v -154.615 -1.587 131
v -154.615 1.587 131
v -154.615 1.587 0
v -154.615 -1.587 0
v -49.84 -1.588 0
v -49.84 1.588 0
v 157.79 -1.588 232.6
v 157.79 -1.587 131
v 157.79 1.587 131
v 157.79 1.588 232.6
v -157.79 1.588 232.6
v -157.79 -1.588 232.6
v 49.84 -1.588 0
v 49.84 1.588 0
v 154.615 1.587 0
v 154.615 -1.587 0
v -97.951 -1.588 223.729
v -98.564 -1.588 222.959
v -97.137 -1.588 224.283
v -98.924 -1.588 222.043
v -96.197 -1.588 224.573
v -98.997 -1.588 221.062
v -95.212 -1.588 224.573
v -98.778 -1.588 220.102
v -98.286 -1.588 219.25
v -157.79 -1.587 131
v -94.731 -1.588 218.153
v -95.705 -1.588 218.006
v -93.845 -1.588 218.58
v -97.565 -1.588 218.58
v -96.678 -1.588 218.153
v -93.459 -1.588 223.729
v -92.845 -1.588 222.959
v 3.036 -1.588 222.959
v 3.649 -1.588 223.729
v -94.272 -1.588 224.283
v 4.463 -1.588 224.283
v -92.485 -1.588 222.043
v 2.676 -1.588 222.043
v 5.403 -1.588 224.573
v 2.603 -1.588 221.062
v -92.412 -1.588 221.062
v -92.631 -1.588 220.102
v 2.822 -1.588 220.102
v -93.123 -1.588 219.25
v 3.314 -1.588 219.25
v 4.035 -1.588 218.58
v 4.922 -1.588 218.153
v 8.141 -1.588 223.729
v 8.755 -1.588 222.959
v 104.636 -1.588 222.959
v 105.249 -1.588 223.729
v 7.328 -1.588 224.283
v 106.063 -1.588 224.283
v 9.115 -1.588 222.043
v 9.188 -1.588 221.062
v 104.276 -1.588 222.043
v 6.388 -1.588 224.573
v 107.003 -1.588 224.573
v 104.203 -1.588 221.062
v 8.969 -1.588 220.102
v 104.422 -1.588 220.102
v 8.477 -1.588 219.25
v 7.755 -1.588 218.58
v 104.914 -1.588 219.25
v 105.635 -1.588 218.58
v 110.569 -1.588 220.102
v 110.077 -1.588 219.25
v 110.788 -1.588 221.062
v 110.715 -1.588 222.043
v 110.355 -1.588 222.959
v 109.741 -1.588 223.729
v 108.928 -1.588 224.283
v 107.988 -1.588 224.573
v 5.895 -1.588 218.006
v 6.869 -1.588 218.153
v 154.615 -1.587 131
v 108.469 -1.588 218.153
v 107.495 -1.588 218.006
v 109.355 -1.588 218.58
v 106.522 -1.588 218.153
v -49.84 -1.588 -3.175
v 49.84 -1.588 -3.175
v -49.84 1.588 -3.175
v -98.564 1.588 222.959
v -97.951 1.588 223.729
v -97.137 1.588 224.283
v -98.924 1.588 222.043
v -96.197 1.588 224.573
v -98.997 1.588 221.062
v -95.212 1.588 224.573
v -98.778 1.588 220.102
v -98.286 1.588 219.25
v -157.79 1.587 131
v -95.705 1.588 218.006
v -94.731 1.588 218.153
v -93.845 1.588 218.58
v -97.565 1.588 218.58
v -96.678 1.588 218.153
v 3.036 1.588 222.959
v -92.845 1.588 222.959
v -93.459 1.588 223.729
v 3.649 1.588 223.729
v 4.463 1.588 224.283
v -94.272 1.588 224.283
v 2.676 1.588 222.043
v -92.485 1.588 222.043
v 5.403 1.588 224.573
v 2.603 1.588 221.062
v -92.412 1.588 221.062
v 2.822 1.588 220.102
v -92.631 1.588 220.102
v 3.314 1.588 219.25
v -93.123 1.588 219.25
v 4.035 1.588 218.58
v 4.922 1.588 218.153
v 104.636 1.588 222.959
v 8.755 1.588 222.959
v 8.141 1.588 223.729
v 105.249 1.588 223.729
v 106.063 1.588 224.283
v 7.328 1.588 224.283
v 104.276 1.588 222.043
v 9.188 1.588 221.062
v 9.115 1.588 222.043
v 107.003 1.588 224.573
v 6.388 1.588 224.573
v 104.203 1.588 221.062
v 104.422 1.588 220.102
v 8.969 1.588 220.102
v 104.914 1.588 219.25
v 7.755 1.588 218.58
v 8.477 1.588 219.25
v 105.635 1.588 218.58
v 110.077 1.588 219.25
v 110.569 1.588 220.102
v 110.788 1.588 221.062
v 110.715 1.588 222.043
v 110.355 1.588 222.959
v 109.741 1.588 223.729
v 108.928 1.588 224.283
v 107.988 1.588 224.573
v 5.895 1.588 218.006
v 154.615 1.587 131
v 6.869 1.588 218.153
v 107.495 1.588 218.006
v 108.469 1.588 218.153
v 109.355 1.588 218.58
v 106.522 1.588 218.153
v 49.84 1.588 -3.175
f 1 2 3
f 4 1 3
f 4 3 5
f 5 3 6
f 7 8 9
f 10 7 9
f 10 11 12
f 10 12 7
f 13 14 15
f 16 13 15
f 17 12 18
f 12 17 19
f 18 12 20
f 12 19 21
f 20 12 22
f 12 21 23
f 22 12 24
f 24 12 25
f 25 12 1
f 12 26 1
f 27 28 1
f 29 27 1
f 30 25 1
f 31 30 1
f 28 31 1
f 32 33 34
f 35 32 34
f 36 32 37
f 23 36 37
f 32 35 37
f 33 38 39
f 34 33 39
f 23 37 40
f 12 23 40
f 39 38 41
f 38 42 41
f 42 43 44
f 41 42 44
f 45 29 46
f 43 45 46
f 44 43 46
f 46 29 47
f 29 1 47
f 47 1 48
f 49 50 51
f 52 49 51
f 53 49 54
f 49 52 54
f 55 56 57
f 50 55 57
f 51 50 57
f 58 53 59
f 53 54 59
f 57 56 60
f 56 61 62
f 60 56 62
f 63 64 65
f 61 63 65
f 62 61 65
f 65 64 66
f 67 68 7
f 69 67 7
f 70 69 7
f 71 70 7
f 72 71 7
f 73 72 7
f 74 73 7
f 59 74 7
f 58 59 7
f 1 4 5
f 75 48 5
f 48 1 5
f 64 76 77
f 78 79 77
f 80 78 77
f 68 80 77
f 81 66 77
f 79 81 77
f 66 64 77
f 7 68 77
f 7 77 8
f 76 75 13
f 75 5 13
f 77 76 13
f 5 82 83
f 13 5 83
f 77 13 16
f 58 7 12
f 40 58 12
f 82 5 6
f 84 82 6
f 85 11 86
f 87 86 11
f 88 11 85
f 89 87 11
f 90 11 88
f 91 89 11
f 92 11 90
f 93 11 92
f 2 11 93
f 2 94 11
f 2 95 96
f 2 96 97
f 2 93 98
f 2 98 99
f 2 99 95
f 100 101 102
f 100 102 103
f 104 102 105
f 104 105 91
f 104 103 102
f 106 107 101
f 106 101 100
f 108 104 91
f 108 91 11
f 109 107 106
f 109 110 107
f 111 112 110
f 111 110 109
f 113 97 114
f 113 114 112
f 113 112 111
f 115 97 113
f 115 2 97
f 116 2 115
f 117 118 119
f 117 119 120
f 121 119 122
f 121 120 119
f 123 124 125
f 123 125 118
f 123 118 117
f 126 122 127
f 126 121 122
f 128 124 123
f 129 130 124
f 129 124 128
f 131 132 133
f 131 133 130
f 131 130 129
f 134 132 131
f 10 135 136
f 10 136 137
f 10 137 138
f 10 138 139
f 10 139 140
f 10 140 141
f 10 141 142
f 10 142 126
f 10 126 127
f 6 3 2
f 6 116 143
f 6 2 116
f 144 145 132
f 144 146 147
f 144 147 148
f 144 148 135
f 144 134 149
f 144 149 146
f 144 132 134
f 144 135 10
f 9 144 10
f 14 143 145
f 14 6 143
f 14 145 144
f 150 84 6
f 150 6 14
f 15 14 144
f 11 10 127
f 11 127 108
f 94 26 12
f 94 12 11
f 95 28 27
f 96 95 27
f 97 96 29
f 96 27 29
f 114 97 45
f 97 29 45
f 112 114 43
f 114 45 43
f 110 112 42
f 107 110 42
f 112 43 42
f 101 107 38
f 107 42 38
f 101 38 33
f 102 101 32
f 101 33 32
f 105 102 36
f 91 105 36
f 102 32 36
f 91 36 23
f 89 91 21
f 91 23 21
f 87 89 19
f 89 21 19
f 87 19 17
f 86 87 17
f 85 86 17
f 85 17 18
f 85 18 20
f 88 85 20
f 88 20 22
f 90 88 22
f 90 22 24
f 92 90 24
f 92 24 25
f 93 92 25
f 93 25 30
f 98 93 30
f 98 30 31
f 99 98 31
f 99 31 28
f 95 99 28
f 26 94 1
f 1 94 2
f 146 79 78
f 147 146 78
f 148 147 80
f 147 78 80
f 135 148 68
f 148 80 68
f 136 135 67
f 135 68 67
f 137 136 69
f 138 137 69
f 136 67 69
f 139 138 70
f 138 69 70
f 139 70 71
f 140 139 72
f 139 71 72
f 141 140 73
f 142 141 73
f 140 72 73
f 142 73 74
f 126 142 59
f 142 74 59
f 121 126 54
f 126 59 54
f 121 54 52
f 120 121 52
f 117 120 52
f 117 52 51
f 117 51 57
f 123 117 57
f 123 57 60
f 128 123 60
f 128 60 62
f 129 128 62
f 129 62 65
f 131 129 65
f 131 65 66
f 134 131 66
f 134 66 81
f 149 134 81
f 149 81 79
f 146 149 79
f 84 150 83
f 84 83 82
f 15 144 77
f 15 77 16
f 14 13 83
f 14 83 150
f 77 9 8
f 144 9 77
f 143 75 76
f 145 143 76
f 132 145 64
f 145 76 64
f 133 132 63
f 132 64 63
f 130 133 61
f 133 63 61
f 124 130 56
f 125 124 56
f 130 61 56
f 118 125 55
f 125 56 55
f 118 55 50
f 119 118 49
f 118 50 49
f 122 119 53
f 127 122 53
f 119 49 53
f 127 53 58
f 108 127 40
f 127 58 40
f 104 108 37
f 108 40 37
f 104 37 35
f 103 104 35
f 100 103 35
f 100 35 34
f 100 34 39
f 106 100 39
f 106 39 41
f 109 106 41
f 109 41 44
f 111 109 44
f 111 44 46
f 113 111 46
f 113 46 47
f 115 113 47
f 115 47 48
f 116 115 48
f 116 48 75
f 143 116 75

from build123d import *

# Parameters (mm, degrees)
SKETCH1_W           = 315.58
SKETCH1_H           = 3.175
BOSS_EXTRUDE1_DEPTH = 232.600000128
SKETCH5_W           = 3.175
SKETCH5_H           = 130.999992
CUT_EXTRUDE2_DEPTH  = 282.088108579
SKETCH7_R           = 3.302
CUT_EXTRUDE3_DEPTH  = 282.088108579
LPATTERN1_COUNT     = 3
LPATTERN1_PITCH     = 101.6
SKETCH10_W          = 99.68
SKETCH10_H          = 3.175
BOSS_EXTRUDE2_DEPTH = 3.175


with BuildPart() as part:
    # Sketch1 → Boss-Extrude1 (new body)
    with BuildSketch(Plane.XY):
        Rectangle(SKETCH1_W, SKETCH1_H)
    extrude(amount=BOSS_EXTRUDE1_DEPTH)

    # Sketch5 → Cut-Extrude2 (cut, symmetric)
    with BuildSketch(Plane(origin=(0, 1.5875, 0), x_dir=(1, 0, 0), z_dir=(0, 1, 0))):
        with Locations((-156.2025, -65.499996)):
            Rectangle(SKETCH5_W, SKETCH5_H)
    cut_extrude2 = extrude(amount=CUT_EXTRUDE2_DEPTH, both=True, mode=Mode.SUBTRACT)

    # Mirror1: Cut-Extrude2 across plane
    add(cut_extrude2.mirror(Plane(origin=(0, 0, 0), x_dir=(0, 0, 1), z_dir=(1, 0, 0))), mode=Mode.SUBTRACT)

    # Sketch7 → Cut-Extrude3 (cut, through all)
    with BuildSketch(Plane.XZ.offset(1.5875)):
        with Locations(Location((107.495393219, 221.30835, 0), (0, 0, 270))):
            Circle(SKETCH7_R)
    cut_extrude3 = extrude(amount=-CUT_EXTRUDE3_DEPTH, mode=Mode.SUBTRACT)

    # LPattern1: Cut-Extrude3 ×3
    with Locations(*[(-i * LPATTERN1_PITCH, 0, 0) for i in range(1, LPATTERN1_COUNT)]):
        add(cut_extrude3, mode=Mode.SUBTRACT)

    # Sketch10 → Boss-Extrude2 (add)
    with BuildSketch(Plane(origin=(0, 0, 0), x_dir=(-1, 0, 0), z_dir=(0, 0, -1))):
        Rectangle(SKETCH10_W, SKETCH10_H)
    extrude(amount=BOSS_EXTRUDE2_DEPTH)


solid = part.part
